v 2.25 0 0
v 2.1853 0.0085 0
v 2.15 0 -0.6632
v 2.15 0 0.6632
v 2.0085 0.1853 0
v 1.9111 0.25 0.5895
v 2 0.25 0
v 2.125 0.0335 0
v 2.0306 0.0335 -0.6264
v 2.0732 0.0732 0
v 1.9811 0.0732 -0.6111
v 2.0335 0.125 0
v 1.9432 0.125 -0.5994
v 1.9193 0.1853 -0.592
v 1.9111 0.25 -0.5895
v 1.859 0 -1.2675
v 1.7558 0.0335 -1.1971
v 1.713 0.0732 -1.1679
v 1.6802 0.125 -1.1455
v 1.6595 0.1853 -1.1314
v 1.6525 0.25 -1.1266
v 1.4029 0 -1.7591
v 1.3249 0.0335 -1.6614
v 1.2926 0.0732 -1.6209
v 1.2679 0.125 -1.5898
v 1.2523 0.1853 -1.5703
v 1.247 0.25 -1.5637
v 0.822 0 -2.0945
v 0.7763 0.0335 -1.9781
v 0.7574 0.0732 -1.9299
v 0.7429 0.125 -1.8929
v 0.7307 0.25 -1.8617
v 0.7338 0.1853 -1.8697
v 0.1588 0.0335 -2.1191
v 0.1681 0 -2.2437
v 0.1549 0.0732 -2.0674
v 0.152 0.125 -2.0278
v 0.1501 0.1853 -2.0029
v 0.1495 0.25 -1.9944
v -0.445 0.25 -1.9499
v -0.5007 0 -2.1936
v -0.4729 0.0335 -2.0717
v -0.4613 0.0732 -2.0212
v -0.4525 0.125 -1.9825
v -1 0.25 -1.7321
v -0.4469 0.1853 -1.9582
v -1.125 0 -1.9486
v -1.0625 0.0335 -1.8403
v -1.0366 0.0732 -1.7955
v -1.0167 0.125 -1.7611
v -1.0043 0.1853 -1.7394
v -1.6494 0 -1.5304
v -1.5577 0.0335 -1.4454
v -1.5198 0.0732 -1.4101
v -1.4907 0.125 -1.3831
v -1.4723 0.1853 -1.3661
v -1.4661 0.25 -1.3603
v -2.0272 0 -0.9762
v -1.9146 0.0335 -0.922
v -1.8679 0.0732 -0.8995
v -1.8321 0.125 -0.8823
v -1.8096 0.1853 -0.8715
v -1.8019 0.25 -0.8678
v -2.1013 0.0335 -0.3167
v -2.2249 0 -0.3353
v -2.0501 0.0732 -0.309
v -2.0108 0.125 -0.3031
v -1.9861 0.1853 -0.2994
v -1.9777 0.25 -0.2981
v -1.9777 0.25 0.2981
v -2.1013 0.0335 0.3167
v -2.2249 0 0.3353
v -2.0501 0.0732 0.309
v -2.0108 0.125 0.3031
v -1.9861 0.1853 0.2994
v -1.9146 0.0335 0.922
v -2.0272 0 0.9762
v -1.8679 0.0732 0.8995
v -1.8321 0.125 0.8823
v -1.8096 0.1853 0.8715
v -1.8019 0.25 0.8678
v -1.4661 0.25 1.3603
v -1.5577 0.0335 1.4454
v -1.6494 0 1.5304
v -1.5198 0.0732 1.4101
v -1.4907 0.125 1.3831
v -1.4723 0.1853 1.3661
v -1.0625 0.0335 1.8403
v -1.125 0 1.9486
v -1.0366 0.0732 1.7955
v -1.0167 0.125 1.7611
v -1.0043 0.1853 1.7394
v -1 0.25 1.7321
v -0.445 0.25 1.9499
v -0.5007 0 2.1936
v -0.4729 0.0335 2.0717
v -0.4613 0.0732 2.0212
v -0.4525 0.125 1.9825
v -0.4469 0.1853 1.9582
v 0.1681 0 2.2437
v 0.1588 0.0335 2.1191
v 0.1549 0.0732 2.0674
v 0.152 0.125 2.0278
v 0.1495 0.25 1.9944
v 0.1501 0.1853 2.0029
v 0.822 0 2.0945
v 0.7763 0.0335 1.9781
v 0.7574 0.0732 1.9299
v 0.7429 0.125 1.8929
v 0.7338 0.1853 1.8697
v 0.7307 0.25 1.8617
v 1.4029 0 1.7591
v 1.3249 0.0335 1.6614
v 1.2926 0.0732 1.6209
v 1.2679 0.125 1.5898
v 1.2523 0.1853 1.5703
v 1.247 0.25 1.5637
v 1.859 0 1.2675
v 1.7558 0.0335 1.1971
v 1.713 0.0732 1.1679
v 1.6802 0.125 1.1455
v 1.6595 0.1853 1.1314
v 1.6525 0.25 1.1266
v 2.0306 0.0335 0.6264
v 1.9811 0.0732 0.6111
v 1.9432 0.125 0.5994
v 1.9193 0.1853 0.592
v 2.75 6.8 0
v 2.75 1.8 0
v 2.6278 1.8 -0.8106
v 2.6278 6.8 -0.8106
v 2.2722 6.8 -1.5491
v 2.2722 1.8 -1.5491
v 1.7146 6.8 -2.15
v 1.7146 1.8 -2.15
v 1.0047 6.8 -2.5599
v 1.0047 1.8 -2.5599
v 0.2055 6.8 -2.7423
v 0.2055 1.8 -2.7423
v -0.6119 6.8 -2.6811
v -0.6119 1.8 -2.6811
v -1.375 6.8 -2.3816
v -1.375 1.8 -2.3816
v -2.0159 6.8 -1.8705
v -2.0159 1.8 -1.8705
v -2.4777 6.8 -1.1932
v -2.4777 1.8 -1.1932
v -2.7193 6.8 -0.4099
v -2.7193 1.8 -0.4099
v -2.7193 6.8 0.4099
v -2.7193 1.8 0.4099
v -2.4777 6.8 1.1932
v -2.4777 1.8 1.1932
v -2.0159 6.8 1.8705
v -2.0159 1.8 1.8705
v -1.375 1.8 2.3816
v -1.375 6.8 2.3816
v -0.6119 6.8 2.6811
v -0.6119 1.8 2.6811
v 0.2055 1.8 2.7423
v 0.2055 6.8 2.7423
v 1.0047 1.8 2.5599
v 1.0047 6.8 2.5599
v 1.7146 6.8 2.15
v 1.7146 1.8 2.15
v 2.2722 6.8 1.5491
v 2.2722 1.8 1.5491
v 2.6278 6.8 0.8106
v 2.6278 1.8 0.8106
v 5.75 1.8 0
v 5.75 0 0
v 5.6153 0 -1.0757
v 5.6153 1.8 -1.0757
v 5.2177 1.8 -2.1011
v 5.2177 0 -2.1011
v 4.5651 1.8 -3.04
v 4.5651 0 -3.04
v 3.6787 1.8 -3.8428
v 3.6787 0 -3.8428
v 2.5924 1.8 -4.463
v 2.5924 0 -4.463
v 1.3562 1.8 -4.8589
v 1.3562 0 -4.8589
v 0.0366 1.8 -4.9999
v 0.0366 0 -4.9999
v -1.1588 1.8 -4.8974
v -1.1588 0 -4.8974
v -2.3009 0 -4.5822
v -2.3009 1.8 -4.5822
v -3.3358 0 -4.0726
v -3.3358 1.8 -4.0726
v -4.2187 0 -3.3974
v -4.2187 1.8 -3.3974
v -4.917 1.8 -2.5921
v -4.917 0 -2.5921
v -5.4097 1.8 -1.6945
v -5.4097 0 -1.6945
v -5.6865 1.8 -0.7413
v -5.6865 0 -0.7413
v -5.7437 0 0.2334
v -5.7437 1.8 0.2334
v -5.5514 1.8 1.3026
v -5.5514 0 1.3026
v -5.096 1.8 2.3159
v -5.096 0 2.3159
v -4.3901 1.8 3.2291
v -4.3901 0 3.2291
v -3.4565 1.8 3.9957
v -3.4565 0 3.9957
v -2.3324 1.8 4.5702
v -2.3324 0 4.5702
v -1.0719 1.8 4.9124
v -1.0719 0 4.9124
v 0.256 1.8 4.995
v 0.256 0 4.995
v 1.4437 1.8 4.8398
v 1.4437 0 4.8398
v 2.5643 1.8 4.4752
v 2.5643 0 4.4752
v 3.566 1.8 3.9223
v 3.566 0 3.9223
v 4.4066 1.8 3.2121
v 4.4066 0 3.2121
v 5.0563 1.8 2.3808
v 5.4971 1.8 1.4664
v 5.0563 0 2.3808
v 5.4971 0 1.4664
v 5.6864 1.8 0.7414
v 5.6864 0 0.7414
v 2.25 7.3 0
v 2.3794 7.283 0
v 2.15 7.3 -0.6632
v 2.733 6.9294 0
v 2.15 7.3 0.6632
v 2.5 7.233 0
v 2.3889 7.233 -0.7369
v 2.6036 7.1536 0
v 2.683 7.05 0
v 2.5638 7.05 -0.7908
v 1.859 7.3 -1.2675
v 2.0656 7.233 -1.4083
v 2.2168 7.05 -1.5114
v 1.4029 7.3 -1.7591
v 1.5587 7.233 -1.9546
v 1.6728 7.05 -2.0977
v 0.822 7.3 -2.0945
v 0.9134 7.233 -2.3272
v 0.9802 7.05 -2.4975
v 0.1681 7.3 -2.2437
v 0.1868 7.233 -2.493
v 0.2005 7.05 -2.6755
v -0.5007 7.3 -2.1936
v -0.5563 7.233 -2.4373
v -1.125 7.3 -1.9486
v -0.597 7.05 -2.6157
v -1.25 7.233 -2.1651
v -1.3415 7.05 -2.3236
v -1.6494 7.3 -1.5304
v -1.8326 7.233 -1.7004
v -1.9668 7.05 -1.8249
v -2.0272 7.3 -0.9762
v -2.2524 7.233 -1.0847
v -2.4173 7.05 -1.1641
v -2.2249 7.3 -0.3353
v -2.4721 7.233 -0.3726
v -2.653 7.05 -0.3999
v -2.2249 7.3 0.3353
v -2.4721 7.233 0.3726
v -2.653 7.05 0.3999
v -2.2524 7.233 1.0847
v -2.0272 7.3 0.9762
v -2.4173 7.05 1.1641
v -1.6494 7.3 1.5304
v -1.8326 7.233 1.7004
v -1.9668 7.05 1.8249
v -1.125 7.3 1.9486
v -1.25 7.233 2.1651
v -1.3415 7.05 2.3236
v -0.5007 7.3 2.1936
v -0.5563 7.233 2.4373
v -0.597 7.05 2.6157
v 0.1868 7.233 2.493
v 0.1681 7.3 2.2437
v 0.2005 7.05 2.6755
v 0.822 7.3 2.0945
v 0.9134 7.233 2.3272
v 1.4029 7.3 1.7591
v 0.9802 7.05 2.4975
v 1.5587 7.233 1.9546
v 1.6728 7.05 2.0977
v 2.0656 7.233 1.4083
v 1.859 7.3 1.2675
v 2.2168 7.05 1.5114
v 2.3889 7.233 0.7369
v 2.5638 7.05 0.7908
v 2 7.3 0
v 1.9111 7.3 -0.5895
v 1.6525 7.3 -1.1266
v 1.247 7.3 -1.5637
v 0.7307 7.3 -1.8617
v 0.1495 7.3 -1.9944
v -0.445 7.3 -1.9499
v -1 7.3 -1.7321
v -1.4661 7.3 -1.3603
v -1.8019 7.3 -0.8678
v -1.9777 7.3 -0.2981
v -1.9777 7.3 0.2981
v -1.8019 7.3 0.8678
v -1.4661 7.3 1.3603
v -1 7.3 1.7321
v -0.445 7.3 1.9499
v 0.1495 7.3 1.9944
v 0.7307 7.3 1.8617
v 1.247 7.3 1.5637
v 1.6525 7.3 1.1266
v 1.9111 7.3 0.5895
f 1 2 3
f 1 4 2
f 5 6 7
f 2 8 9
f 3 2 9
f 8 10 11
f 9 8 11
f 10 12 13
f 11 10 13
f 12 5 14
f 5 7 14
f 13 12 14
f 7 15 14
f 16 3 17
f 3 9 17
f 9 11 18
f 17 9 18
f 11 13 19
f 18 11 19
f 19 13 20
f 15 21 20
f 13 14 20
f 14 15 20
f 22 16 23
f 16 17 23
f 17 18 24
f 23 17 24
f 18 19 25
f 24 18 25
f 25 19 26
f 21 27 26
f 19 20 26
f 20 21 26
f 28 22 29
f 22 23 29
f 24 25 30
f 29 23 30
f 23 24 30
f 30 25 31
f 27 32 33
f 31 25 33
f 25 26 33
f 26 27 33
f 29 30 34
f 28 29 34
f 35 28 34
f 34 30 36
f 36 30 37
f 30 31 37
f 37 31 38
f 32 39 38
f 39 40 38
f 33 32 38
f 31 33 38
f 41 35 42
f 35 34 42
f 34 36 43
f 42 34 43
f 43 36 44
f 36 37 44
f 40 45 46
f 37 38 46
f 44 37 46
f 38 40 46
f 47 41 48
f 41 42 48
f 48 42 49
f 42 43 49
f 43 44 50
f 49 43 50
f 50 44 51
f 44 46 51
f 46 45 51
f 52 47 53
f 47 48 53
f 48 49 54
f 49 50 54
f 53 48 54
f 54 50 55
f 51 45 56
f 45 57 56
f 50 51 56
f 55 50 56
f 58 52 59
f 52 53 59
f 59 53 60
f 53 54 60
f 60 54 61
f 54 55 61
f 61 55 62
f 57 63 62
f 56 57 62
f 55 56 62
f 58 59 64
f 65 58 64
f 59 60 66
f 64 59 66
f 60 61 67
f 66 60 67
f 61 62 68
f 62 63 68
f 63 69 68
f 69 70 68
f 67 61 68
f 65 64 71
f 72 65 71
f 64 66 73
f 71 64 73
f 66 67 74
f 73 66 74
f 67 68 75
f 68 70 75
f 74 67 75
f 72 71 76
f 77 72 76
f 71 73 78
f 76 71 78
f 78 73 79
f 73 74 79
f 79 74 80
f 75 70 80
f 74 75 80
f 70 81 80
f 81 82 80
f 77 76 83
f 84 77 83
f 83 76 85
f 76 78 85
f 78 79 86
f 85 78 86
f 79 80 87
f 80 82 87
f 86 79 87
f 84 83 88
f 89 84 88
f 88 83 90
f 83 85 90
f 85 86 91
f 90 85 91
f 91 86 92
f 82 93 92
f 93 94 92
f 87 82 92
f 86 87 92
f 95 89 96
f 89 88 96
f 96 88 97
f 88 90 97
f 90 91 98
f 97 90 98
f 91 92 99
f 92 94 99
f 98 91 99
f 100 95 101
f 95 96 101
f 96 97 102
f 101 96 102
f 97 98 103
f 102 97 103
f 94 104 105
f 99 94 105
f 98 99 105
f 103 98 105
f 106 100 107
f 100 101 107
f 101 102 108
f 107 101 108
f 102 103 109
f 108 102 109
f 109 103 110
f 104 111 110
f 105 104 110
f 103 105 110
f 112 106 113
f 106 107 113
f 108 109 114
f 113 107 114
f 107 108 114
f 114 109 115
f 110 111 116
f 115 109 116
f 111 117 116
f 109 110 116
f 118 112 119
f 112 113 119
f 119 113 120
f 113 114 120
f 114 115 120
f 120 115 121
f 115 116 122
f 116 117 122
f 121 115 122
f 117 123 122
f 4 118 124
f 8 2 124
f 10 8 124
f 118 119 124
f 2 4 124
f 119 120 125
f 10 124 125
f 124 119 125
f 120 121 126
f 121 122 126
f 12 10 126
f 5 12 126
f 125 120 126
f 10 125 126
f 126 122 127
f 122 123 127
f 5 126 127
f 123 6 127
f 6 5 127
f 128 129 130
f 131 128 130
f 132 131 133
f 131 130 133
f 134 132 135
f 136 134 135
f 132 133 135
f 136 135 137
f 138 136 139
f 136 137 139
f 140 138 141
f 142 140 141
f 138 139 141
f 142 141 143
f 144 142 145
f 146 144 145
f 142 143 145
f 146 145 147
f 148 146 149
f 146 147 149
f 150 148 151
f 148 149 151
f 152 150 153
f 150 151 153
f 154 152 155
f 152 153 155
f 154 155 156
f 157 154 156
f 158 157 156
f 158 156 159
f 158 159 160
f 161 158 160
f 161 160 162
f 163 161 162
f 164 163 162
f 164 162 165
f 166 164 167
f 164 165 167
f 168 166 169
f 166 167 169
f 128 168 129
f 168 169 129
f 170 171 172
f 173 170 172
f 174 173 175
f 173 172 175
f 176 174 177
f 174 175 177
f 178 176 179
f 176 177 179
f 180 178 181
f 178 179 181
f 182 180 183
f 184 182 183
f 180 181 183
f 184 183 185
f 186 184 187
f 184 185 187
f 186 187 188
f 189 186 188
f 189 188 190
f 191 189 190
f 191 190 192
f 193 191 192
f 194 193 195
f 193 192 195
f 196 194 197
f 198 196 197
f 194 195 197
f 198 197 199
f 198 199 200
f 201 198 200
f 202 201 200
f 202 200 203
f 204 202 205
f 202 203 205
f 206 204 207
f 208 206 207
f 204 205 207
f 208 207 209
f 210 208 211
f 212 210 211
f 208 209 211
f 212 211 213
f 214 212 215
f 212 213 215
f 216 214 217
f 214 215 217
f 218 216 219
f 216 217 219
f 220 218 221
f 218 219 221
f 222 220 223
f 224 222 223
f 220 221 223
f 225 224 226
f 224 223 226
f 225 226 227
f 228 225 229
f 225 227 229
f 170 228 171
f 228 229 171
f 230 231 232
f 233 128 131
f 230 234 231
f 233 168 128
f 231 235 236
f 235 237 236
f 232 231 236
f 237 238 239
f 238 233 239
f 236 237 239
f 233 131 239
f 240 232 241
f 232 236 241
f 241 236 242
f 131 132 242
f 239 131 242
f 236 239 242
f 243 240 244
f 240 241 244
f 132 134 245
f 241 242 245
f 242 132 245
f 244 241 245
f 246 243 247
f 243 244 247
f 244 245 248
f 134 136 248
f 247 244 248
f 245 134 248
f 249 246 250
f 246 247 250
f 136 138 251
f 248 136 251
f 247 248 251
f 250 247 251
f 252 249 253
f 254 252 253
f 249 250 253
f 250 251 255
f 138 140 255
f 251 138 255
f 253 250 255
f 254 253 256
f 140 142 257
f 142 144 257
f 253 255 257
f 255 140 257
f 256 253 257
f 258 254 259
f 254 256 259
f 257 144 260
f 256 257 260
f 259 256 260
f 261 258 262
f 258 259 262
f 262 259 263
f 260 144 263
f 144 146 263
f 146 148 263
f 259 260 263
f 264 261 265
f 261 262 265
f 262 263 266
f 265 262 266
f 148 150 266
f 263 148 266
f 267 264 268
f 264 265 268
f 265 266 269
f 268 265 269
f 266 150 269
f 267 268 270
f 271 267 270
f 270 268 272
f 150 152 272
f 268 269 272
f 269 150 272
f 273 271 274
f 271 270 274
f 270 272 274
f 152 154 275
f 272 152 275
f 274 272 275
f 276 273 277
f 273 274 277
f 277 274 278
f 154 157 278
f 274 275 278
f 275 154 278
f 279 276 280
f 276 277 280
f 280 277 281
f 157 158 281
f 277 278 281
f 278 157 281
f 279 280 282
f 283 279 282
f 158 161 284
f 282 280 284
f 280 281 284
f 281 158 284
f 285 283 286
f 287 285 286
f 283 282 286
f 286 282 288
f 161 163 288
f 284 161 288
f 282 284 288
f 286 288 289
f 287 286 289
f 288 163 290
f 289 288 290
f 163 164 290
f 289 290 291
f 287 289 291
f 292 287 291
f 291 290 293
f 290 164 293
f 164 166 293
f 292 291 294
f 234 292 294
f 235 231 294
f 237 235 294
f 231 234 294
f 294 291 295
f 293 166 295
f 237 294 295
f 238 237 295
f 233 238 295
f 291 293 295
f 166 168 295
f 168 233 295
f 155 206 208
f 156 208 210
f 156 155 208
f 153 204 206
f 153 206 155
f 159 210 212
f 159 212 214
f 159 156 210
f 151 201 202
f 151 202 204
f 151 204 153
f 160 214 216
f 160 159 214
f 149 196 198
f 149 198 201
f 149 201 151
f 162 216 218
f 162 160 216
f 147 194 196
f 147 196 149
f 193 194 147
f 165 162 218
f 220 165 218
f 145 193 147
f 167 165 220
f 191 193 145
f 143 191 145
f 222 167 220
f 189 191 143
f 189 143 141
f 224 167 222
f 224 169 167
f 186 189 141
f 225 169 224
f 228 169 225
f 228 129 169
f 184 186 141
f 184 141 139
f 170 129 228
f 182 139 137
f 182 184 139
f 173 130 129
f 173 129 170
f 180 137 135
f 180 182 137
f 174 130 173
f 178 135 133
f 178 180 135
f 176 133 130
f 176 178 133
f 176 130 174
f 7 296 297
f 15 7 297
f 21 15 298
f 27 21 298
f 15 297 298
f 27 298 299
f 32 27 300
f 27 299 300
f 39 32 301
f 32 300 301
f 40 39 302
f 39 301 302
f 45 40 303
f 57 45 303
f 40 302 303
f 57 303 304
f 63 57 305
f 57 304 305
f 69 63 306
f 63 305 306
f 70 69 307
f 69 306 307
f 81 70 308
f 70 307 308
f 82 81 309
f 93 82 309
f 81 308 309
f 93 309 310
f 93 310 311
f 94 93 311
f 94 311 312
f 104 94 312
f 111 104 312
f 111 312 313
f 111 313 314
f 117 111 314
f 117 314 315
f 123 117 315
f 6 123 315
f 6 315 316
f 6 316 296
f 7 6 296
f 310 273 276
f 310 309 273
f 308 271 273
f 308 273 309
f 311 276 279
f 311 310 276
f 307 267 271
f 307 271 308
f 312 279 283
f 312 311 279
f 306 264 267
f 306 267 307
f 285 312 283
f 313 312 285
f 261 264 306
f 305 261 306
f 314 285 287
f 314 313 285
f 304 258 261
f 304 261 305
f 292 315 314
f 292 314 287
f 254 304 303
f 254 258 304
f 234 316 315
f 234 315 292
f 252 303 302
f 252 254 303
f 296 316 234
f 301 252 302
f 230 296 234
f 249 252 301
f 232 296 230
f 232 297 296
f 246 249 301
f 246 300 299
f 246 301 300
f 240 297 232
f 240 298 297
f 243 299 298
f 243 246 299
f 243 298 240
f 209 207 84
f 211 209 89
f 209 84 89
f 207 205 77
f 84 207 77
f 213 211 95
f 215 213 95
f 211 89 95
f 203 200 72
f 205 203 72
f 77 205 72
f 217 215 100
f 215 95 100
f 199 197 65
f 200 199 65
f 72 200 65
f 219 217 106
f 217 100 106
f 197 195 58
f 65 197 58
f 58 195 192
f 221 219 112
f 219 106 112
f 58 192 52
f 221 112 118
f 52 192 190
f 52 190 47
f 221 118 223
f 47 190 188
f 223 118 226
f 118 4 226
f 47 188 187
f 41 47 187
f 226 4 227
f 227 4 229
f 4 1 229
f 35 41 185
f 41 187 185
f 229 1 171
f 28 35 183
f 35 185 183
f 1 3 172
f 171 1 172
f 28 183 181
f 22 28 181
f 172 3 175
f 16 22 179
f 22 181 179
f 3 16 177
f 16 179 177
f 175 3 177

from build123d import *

# Parameters (mm, degrees)
SKETCH1_RX          = 5.75
SKETCH1_RY          = 5
BOSS_EXTRUDE1_DEPTH = 1.8
SKETCH2_R           = 2.75
BOSS_EXTRUDE2_DEPTH = 5.5
SKETCH3_R           = 2
CUT_EXTRUDE1_DEPTH  = 8.3
FILLET1_R           = 0.25
FILLET2_R           = 0.5


with BuildPart() as part:
    # Sketch1 → Boss-Extrude1 (new body)
    with BuildSketch(Plane(origin=(0, 0, 0), x_dir=(1, 0, 0), z_dir=(0, 1, 0))):
        with Locations((0, 0)):
            Ellipse(SKETCH1_RX, SKETCH1_RY)
    extrude(amount=BOSS_EXTRUDE1_DEPTH)

    # Sketch2 → Boss-Extrude2 (add)
    with BuildSketch(Plane(origin=(0, 1.8, 0), x_dir=(1, 0, 0), z_dir=(0, 1, 0))):
        Circle(SKETCH2_R)
    extrude(amount=BOSS_EXTRUDE2_DEPTH)

    # Sketch3 → Cut-Extrude1 (cut, through all)
    with BuildSketch(Plane(origin=(0, 7.3, 0), x_dir=(1, 0, 0), z_dir=(0, 1, 0))):
        Circle(SKETCH3_R)
    extrude(amount=-CUT_EXTRUDE1_DEPTH, mode=Mode.SUBTRACT)

    # Fillet1
    fillet1_edges = [part.edges().sort_by_distance(p)[0] for p in [
        (-2, 0, 0),
    ]]
    fillet(fillet1_edges, radius=FILLET1_R)

    # Fillet2
    fillet2_edges = [part.edges().sort_by_distance(p)[0] for p in [
        (-2.75, 7.3, 0),
    ]]
    fillet(fillet2_edges, radius=FILLET2_R)


solid = part.part
